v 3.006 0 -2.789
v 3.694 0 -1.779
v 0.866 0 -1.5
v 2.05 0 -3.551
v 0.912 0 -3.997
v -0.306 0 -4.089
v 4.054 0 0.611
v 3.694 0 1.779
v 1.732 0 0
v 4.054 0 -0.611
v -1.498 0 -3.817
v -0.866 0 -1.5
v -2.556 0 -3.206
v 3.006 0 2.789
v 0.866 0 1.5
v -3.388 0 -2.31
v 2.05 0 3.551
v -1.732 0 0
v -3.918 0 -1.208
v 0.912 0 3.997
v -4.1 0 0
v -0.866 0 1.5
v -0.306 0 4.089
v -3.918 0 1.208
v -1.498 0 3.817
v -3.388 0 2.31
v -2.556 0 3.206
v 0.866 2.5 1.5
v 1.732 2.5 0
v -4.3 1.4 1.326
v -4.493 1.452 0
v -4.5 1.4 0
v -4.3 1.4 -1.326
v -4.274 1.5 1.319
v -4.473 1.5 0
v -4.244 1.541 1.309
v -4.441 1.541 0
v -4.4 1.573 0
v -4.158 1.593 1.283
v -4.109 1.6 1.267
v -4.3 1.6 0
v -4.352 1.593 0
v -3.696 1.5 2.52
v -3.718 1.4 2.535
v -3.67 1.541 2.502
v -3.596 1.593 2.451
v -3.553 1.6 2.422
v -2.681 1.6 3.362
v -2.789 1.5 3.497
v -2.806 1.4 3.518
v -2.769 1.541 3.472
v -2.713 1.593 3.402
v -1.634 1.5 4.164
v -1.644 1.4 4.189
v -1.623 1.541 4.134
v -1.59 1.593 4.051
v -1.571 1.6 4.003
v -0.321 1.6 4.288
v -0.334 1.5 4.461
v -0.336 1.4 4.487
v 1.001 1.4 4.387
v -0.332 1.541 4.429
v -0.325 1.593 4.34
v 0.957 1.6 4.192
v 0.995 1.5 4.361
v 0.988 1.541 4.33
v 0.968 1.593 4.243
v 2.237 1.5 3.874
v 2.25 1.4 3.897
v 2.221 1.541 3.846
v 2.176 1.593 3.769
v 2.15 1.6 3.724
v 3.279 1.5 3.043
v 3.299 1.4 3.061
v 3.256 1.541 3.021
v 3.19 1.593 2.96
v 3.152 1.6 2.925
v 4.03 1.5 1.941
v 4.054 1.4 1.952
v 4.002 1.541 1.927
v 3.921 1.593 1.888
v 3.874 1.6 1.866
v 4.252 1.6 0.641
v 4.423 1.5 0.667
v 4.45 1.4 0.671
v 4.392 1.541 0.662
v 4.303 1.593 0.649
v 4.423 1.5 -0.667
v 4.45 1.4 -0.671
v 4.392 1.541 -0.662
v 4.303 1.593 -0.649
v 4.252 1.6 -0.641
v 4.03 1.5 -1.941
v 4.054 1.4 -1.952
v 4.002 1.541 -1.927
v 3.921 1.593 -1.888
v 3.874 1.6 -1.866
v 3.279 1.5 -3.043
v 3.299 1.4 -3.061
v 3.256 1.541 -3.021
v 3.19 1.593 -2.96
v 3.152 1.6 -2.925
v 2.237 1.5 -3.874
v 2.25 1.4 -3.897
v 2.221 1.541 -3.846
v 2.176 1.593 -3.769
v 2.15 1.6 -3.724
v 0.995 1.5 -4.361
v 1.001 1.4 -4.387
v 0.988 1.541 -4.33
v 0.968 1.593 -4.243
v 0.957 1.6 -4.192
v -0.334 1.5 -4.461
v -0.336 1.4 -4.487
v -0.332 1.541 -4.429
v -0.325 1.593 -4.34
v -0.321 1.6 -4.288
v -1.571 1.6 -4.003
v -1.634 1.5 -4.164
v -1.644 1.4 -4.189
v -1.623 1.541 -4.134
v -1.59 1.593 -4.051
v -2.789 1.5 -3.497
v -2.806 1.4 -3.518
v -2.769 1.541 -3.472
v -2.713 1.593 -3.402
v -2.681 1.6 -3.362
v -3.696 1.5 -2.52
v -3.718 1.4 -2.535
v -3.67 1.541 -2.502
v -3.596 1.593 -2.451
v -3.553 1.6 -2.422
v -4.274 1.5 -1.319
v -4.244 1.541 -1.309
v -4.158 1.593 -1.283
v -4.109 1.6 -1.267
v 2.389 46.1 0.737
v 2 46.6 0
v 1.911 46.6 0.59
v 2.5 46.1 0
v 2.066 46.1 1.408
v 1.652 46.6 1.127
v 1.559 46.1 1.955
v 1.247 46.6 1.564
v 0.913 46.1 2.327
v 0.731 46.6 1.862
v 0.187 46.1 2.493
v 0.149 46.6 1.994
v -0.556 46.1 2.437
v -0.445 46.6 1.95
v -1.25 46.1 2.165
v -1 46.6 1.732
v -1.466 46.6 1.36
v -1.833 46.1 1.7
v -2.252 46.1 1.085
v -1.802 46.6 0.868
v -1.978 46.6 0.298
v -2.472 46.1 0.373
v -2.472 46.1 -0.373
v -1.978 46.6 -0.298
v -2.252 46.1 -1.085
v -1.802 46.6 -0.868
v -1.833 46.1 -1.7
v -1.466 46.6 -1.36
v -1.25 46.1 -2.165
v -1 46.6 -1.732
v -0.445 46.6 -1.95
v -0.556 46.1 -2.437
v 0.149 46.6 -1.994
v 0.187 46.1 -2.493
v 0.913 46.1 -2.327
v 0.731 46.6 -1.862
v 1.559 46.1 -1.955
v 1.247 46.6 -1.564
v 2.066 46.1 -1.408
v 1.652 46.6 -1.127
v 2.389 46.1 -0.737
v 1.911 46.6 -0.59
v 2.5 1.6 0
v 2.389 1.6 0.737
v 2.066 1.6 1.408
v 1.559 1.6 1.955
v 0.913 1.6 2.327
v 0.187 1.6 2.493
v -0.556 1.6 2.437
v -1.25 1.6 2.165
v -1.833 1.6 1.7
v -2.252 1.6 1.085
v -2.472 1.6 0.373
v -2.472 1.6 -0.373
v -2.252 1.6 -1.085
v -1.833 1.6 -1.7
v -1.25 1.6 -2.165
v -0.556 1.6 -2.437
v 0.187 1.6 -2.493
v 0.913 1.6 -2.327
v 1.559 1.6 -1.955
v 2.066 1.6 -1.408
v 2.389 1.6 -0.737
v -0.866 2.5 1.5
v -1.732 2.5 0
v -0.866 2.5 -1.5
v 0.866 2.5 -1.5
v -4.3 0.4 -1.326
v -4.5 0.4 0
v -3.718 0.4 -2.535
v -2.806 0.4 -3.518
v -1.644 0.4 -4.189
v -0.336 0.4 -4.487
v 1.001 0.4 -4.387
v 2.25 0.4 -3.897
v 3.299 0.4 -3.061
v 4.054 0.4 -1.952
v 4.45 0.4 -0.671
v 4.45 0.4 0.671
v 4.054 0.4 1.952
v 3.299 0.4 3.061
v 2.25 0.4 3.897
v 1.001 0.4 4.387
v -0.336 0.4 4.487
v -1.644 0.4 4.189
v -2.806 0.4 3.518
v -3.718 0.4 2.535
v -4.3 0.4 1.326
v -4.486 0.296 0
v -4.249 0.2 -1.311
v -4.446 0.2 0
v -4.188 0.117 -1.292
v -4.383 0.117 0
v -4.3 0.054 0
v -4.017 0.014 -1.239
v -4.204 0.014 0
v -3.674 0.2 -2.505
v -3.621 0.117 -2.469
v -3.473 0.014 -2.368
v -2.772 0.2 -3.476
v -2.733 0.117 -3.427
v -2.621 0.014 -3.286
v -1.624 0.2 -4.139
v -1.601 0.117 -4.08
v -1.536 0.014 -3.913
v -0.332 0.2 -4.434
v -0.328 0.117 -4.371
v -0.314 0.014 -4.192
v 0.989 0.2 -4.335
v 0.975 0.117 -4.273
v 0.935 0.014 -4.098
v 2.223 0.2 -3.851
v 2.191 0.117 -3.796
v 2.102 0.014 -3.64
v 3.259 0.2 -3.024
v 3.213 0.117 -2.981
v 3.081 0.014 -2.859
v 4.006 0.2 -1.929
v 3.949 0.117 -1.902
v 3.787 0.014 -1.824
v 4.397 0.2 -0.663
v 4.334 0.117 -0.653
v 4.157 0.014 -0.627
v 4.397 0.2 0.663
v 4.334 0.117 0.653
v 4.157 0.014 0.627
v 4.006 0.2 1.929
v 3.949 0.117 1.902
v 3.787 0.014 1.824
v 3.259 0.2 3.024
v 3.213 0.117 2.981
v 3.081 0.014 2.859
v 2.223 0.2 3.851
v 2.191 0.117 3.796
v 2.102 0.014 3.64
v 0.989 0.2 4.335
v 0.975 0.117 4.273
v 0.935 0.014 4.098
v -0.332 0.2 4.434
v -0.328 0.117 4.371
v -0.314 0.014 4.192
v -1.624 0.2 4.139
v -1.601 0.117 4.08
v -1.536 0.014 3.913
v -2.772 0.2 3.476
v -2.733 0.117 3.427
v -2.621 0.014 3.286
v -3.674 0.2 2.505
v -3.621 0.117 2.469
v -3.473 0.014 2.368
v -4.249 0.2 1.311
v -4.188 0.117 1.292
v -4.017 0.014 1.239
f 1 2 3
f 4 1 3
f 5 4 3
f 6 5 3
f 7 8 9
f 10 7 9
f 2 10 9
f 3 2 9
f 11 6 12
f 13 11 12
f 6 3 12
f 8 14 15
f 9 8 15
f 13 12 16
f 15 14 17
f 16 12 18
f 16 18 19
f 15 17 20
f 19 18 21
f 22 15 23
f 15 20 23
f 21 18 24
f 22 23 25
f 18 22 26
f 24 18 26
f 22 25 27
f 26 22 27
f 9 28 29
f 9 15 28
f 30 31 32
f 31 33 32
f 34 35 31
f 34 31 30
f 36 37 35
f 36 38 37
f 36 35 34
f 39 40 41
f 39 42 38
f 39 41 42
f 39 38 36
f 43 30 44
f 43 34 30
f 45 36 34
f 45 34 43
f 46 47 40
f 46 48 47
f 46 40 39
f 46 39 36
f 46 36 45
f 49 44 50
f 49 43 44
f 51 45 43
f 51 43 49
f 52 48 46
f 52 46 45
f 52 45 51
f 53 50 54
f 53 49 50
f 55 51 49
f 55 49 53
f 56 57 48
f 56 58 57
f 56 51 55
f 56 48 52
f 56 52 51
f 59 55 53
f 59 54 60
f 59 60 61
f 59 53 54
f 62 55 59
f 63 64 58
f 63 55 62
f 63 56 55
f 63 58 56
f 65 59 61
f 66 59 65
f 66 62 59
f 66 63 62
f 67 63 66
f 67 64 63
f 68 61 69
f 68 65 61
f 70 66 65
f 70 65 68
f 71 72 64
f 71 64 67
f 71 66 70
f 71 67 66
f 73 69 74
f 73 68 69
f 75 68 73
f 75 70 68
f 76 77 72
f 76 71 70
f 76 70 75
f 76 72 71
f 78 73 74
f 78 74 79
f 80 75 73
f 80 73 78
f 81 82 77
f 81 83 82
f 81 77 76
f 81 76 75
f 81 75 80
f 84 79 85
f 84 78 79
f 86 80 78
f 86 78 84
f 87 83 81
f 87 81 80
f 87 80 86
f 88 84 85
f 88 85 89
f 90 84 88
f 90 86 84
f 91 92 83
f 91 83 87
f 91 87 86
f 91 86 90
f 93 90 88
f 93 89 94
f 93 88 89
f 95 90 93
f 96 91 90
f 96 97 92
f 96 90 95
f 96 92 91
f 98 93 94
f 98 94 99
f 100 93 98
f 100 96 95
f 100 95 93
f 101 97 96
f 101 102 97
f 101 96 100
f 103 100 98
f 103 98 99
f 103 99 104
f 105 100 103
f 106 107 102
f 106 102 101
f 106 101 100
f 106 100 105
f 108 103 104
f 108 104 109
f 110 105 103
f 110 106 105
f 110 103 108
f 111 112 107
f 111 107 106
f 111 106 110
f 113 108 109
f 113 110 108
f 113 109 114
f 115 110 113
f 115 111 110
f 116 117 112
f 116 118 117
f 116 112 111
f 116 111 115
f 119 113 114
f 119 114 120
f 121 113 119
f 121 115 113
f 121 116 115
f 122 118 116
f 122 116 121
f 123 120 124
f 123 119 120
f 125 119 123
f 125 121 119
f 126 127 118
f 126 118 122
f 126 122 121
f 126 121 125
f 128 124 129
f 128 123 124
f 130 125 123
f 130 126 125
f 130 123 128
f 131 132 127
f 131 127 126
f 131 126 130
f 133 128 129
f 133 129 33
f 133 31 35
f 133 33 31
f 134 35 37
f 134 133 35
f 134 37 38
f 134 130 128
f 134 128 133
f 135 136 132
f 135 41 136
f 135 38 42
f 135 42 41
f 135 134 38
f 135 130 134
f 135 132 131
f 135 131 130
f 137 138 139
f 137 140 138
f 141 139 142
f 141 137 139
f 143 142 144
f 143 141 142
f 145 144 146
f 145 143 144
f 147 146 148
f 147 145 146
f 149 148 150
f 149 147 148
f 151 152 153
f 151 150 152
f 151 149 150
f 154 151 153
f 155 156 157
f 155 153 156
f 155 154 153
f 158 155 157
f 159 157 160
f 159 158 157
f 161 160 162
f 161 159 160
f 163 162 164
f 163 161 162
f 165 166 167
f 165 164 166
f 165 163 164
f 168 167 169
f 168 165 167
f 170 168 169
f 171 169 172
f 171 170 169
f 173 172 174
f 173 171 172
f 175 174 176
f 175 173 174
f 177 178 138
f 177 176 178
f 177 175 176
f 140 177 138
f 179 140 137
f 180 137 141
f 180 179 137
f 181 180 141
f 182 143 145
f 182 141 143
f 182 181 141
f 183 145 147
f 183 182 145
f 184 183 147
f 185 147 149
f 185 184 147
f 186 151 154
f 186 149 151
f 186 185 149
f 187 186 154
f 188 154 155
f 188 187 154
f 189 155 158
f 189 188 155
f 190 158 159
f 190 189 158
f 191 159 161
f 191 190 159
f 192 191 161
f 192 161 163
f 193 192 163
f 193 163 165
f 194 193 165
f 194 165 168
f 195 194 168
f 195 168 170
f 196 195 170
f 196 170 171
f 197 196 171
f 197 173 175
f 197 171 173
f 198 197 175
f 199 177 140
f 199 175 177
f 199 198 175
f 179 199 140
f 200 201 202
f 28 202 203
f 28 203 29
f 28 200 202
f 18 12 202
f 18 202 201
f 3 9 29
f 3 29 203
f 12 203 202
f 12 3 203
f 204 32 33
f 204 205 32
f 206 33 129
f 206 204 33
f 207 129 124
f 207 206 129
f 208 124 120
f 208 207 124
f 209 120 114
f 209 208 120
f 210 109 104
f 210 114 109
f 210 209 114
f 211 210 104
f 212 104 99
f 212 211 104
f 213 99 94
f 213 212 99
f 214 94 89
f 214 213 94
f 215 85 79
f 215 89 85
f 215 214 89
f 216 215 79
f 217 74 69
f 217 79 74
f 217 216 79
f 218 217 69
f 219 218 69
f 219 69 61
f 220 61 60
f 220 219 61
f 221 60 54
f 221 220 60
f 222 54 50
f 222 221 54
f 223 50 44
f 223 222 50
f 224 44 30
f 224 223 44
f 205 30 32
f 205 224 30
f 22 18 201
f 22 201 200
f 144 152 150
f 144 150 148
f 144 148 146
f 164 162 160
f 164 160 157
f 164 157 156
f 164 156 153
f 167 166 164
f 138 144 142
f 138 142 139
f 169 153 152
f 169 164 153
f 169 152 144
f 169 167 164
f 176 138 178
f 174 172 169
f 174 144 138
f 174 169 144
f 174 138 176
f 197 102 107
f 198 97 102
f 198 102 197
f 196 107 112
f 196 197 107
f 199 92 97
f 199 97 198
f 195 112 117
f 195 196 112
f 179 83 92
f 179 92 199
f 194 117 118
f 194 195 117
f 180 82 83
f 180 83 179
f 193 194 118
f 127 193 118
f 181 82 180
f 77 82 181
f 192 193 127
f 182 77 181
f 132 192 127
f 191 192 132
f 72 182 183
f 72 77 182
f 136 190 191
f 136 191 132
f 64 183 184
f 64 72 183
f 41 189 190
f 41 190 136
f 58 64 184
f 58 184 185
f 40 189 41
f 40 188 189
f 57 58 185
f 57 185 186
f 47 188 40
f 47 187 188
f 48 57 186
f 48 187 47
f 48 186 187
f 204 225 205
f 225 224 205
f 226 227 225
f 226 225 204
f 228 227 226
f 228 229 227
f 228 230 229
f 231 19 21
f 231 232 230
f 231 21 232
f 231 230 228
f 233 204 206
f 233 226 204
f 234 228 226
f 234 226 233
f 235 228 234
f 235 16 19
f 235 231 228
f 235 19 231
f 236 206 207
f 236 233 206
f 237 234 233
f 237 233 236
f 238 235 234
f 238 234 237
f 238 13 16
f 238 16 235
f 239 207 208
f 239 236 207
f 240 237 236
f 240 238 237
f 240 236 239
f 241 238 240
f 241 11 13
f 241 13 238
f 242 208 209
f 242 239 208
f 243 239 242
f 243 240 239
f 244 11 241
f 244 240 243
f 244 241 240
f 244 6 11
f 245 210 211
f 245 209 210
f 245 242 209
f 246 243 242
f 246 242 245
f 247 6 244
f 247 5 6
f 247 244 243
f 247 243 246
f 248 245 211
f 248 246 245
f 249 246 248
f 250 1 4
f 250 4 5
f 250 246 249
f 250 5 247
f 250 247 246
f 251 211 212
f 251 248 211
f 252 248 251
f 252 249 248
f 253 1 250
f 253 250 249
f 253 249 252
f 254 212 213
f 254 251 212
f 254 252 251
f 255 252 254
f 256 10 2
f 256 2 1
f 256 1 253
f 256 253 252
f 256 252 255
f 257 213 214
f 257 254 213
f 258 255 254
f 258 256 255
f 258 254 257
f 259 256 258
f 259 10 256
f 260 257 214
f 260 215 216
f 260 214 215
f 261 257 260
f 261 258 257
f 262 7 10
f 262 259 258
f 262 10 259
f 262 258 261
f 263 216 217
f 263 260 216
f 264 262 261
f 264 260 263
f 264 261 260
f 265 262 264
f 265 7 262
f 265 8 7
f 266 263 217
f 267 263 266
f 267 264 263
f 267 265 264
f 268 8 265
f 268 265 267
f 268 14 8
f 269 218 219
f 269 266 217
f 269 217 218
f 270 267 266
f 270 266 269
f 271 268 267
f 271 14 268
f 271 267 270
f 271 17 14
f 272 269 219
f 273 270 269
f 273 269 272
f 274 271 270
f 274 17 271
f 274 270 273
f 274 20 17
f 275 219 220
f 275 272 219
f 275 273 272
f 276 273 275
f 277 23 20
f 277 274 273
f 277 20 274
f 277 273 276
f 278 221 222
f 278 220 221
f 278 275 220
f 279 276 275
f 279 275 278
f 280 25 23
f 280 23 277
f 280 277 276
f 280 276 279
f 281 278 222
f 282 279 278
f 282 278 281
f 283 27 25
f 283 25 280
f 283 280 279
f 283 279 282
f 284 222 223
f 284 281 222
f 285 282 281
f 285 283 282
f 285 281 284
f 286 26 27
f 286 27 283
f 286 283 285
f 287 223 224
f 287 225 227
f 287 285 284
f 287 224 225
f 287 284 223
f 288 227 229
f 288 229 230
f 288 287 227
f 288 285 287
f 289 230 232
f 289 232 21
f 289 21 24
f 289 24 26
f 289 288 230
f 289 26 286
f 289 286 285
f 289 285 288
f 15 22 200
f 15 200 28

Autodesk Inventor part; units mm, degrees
ref_plane "YZ Plane" through (0, 0, 0) normal (1, 0, 0) x (0, 1, 0)
ref_plane "XZ Plane" through (0, 0, 0) normal (0, 1, 0) x (-1, 0, 0)
ref_plane "XY Plane" through (0, 0, 0) normal (0, 0, 1) x (1, 0, 0)
sketch "Boceto1" plane through (0, 0, 0) normal (0, 1, 0) x (-1, 0, 0)
  circle A0 centre (0, 0) radius 4.5
  dimension "d0" = 9
extrude "Extrusión1" add sketch "Boceto1" along normal blind 1.6
sketch "Boceto2" plane through (0, 1.6, 0) normal (0, 1, 0) x (1, 0, 0)
  circle A0 centre (0, 0) radius 2.5
  dimension "d3" = 5
extrude "Extrusión2" add sketch "Boceto2" along normal blind 45
fillet "Empalme1" radius 0.4 1 edges at (4.5, 0, 0)
fillet "Empalme2" radius 0.2 1 edges at (4.5, 1.6, 0)
sketch "Boceto3" plane through (0, 0, 0) normal (0, -1, 0) x (1, 0, 0)
  line L0 (-1.7321, 0) -> (-0.866, 1.5)
  line L1 (-0.866, 1.5) -> (0.866, 1.5)
  line L2 (0.866, 1.5) -> (1.7321, 0)
  line L3 (1.7321, 0) -> (0.866, -1.5)
  line L4 (0.866, -1.5) -> (-0.866, -1.5)
  line L5 (-0.866, -1.5) -> (-1.7321, 0)
  point P0 (0, 0)
  point P1 (0, 0)
  dimension "d8" = 3
extrude "Extrusión3" cut sketch "Boceto3" against normal blind 2.5
chamfer "Chaflán1" distance 0.5 angle 45 1 edges at (-2.5, 46.6, 0)
thread "Rosca2" size "M5x0.8" class "6g" standard "ANSI Metric M Profile" length 20
properties part number "Perno M5x8 cabeza plana" material "Hierro, gris"
